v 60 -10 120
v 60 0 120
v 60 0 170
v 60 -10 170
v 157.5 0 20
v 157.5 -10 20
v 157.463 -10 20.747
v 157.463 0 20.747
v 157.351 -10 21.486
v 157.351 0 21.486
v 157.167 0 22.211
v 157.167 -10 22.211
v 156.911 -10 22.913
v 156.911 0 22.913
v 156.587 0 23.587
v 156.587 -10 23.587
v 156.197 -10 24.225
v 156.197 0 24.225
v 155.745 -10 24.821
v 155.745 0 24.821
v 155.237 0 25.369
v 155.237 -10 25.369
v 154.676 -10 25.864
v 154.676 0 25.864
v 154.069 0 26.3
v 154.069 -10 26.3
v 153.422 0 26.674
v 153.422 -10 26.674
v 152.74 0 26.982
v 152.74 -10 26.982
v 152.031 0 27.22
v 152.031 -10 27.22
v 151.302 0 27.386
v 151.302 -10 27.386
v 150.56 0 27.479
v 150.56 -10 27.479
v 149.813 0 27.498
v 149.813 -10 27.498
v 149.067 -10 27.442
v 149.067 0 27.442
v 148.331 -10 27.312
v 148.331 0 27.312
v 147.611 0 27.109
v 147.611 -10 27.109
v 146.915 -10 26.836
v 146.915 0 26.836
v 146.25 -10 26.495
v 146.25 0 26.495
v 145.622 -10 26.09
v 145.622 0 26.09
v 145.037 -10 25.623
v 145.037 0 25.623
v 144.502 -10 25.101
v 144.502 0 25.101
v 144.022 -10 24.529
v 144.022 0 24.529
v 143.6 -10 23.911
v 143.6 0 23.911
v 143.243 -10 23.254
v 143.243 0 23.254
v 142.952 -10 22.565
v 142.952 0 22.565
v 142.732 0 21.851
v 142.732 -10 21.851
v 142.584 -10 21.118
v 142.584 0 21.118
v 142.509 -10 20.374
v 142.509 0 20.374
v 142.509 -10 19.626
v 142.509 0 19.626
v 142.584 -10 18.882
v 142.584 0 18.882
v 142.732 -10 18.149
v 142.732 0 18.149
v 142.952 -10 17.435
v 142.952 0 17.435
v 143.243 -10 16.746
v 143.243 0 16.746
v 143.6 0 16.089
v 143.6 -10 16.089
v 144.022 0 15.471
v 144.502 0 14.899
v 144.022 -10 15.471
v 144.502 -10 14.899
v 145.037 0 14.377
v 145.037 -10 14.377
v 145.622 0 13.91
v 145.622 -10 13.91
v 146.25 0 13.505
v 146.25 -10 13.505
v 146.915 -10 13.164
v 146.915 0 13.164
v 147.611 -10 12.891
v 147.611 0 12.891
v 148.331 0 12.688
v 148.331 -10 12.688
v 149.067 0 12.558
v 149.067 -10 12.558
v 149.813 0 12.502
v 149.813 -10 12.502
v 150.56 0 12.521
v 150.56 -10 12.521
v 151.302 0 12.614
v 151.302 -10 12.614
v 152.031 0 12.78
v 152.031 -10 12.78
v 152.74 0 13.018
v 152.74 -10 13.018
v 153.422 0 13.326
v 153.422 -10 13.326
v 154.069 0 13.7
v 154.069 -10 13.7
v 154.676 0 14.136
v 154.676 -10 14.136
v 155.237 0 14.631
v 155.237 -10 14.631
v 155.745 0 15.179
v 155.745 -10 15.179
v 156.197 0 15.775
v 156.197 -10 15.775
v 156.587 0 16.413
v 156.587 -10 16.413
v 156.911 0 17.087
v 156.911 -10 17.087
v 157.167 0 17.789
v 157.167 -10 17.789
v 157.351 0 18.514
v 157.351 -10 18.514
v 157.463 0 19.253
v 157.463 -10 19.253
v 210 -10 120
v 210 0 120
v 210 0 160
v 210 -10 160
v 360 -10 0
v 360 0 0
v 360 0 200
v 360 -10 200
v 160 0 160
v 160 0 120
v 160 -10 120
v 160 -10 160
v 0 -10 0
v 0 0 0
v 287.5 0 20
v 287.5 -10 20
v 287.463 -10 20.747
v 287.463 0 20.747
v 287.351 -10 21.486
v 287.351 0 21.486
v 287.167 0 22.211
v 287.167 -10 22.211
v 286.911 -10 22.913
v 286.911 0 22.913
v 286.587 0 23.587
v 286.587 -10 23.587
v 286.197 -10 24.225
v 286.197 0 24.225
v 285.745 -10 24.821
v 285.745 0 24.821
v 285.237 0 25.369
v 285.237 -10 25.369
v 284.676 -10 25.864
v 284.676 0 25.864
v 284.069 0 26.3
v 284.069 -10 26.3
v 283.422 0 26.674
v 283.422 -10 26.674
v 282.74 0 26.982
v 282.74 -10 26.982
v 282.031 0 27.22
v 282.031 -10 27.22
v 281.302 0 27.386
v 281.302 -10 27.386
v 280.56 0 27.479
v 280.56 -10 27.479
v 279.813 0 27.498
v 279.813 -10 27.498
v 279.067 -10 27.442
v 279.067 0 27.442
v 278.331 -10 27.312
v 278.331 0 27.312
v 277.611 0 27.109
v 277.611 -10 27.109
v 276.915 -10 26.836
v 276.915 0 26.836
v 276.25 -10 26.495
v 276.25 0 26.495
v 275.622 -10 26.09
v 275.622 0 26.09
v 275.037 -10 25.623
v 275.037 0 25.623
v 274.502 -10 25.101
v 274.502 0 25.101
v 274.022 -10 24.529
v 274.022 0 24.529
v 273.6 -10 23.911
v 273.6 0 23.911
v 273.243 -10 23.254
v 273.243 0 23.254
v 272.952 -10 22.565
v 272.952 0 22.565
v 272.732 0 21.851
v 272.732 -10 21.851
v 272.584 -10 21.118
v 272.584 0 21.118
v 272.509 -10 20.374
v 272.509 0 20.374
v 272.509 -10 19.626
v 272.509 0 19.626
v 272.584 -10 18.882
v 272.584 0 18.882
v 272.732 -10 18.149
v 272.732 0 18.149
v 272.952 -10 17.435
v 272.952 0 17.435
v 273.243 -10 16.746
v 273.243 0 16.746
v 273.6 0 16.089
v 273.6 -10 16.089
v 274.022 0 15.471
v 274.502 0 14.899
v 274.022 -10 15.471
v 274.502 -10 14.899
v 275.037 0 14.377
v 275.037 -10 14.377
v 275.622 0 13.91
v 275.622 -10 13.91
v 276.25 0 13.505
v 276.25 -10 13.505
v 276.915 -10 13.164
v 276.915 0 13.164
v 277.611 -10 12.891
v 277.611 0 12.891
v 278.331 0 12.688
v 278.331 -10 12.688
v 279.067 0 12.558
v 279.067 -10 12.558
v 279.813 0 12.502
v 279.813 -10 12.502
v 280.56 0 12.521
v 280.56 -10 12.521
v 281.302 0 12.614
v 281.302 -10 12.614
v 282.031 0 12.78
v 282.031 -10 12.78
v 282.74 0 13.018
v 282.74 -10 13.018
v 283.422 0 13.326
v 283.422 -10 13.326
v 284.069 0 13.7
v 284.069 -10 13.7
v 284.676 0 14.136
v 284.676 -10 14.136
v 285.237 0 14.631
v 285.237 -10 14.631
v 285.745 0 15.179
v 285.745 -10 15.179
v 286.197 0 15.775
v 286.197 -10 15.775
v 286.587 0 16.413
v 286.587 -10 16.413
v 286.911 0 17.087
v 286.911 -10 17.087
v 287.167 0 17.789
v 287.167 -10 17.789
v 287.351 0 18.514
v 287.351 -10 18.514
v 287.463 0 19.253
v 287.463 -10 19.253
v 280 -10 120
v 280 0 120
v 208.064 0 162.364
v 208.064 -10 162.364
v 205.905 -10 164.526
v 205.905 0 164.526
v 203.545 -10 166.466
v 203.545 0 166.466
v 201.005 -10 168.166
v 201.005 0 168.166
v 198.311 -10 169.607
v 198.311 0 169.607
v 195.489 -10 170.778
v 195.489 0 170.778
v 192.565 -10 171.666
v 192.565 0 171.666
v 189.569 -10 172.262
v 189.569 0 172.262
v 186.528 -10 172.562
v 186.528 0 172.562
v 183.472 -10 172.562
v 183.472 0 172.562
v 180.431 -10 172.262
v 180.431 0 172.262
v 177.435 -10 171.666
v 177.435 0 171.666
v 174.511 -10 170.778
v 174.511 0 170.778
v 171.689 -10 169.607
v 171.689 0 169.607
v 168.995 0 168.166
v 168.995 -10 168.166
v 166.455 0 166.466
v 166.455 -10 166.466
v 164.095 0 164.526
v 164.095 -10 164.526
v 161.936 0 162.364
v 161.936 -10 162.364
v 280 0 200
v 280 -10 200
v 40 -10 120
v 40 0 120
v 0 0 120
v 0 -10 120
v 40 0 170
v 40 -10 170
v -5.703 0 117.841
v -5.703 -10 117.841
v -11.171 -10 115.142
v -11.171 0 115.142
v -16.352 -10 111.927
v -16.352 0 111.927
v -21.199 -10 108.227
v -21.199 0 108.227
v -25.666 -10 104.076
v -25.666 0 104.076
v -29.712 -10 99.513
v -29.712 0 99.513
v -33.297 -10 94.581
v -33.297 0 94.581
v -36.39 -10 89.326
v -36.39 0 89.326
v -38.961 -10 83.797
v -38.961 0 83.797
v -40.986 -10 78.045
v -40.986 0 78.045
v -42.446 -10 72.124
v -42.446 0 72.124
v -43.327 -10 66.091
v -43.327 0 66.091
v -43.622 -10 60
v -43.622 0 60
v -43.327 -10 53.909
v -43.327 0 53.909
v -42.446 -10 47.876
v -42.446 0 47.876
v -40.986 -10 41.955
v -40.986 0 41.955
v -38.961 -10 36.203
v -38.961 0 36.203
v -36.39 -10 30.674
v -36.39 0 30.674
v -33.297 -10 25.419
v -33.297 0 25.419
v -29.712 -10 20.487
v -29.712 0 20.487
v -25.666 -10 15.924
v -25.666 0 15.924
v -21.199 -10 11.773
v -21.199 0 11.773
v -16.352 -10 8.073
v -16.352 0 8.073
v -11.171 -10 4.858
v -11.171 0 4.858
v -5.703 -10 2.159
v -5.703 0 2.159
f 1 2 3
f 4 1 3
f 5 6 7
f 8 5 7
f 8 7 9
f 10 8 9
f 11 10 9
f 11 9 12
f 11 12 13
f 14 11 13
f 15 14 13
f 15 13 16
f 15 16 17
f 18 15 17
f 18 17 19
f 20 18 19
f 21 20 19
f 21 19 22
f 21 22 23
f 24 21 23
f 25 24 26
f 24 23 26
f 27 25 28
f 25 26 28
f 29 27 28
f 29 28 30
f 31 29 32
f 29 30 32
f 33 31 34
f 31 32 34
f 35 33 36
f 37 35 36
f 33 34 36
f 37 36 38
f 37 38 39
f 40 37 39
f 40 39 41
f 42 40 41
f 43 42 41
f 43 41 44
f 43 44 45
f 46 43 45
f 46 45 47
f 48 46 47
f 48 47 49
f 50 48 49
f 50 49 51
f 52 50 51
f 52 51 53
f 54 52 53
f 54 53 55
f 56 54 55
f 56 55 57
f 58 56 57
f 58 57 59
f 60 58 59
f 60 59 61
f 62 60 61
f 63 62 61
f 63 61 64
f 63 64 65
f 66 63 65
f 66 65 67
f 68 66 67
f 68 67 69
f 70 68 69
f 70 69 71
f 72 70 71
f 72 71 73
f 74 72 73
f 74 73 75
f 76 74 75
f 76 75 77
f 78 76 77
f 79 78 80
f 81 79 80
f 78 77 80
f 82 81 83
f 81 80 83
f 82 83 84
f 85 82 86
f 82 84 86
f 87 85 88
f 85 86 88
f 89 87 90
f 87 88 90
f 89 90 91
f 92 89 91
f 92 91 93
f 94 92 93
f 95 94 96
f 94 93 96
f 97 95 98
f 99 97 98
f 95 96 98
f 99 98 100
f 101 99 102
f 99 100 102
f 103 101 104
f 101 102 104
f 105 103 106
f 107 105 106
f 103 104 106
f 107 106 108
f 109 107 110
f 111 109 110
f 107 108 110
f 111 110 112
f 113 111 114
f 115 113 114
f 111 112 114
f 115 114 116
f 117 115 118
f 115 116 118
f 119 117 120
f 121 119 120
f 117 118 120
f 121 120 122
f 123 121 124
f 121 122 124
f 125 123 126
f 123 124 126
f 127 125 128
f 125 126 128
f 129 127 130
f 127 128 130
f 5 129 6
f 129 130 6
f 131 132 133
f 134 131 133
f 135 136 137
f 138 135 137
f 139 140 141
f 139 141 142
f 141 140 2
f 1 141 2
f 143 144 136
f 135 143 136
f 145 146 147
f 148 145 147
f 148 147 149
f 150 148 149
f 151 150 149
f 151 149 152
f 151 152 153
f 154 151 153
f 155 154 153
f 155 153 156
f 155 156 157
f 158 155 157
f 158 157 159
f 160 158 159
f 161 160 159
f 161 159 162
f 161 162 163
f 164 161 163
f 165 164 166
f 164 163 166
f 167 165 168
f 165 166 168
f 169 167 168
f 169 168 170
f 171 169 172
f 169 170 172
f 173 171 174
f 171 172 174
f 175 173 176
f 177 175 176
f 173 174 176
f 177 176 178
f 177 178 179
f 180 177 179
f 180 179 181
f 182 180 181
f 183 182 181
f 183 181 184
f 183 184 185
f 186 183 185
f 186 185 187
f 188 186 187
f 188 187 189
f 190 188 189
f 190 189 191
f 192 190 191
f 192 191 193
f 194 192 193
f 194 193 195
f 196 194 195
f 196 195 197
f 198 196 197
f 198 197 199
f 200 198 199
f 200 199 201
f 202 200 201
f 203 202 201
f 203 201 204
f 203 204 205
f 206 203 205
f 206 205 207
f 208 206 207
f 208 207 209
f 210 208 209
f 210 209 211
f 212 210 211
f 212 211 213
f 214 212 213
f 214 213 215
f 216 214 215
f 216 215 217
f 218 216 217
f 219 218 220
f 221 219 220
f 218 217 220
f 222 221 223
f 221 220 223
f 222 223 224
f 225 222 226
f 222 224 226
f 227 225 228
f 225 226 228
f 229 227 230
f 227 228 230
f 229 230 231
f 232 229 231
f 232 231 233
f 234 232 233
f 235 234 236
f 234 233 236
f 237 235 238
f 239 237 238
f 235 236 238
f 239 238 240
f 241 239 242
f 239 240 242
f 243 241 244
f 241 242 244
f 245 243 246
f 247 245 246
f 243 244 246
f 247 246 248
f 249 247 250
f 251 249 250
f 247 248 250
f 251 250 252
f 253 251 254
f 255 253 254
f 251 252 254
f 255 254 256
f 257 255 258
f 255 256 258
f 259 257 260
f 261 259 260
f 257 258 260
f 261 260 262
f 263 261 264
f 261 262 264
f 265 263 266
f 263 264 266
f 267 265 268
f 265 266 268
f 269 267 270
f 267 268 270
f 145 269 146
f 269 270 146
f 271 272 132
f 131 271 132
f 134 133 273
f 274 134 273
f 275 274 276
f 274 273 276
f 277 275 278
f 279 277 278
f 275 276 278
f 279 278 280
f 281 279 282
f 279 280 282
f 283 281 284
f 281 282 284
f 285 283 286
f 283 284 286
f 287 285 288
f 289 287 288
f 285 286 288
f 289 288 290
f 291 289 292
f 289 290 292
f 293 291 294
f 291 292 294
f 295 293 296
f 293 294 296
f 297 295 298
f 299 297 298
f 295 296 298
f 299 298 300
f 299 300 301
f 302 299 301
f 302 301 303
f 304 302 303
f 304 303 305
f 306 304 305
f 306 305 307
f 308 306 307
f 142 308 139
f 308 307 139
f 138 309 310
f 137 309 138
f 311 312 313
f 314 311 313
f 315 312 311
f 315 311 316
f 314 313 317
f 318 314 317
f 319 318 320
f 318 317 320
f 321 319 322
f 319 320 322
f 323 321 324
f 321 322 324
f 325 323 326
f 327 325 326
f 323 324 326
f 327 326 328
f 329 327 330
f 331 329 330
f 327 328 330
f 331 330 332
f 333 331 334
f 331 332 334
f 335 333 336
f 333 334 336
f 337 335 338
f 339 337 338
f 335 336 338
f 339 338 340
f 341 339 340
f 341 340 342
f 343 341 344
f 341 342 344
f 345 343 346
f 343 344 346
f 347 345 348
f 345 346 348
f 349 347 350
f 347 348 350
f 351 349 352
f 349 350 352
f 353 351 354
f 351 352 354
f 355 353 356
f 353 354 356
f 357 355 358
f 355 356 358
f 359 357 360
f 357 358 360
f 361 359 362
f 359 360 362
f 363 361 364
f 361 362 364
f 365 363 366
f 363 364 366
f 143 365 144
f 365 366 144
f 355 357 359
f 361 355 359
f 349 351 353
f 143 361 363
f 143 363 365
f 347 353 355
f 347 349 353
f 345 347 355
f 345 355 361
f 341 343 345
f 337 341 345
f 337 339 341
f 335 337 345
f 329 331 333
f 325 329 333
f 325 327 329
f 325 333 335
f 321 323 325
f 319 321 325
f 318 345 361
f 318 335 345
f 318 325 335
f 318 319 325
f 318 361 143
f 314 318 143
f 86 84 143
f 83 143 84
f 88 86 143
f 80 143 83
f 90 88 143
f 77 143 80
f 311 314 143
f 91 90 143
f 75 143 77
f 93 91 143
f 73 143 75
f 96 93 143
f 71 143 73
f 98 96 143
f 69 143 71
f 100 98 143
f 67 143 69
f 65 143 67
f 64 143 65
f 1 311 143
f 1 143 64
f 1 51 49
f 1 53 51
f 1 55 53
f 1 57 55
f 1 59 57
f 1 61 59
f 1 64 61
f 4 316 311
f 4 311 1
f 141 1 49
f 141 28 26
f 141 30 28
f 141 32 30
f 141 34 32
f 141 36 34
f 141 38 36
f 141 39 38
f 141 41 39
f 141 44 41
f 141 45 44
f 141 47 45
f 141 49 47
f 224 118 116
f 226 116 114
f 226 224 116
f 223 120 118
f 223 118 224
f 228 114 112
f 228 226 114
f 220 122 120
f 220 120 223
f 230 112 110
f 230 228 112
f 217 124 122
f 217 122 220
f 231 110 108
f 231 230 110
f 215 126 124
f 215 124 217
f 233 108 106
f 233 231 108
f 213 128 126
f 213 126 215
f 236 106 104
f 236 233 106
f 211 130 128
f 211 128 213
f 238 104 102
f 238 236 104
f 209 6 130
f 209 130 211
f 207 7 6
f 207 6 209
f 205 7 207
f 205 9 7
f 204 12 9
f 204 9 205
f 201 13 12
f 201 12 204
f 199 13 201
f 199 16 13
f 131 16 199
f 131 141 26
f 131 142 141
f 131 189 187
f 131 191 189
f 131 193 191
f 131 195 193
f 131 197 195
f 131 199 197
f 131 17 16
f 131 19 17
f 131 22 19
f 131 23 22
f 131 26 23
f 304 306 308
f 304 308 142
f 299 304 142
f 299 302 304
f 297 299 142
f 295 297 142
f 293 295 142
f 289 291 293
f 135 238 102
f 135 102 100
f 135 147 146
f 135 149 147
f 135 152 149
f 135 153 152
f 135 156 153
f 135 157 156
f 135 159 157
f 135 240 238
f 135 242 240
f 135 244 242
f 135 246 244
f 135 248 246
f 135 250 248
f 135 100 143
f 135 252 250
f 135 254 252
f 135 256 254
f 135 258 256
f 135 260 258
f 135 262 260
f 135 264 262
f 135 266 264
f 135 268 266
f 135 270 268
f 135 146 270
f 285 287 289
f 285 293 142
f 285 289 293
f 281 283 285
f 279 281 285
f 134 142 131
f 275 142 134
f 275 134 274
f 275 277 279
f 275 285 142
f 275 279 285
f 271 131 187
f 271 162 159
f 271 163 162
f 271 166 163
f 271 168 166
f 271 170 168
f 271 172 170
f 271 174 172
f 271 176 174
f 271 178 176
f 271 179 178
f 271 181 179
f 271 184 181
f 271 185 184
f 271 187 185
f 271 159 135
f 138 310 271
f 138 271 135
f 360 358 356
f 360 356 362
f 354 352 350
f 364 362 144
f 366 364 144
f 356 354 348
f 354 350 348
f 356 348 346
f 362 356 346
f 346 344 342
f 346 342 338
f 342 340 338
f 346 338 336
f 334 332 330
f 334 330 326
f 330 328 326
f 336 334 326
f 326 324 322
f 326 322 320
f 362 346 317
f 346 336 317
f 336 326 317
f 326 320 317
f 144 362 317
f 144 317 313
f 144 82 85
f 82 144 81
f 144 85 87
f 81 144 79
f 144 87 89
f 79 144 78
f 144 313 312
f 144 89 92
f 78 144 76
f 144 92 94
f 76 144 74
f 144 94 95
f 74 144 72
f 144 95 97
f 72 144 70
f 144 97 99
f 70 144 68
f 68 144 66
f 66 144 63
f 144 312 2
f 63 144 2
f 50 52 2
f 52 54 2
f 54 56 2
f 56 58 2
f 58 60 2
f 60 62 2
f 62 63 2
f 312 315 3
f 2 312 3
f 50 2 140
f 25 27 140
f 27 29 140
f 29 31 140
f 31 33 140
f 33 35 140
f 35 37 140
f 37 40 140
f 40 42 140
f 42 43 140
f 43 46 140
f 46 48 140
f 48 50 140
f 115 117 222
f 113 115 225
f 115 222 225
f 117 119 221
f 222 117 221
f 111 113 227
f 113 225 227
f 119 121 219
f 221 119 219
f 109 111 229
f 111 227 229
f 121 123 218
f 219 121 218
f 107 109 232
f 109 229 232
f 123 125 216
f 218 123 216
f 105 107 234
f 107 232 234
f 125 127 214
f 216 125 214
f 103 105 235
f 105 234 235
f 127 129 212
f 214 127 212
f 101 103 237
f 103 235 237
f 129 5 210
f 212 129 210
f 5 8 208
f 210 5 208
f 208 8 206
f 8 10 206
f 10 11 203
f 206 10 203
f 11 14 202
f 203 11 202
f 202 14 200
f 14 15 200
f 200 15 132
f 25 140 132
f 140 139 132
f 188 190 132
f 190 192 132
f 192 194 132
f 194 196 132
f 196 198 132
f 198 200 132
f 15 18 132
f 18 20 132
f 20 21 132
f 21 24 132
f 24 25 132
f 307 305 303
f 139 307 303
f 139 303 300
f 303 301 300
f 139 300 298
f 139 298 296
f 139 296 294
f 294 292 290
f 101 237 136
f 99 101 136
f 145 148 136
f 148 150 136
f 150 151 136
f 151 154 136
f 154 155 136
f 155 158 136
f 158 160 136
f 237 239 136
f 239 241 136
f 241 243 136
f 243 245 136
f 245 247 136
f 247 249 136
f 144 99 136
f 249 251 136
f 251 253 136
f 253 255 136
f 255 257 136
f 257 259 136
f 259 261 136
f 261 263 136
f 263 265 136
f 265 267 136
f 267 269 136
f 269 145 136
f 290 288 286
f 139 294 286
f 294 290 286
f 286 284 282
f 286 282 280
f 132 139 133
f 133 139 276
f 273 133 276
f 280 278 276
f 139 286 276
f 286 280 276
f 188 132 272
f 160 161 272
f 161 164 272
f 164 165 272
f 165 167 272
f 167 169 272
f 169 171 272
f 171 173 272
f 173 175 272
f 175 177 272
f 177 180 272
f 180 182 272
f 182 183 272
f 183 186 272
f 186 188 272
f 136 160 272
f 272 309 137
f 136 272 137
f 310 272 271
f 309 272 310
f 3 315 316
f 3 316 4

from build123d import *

# Parameters (mm, degrees)
F0_W     = 80
F0_H     = 80
F0_W_2   = 20
F0_H_2   = 50
F0_W_3   = 50
F0_H_3   = 40
F1_DEPTH = 10
F2_R     = 7.5
F3_DEPTH = 10.001


with BuildPart() as f1:
    # F0 (on Front) → F1 (new body)
    with BuildSketch(Plane.XZ):
        Polygon((0, 120), (0, 0), (360, 0), (360, 120), (280, 120), (210, 120), (160, 120), (60, 120), (40, 120), align=None)
        with BuildLine():
            ThreePointArc((0, 120), (-43.622246, 60), (0, 0))
            Line((0, 0), (0, 120))
        make_face()
        with Locations((320, 160)):
            Rectangle(F0_W, F0_H)
        with Locations((50, 145)):
            Rectangle(F0_W_2, F0_H_2)
        with Locations((185, 140)):
            Rectangle(F0_W_3, F0_H_3)
        with BuildLine():
            Line((160, 160), (210, 160))
            ThreePointArc((210, 160), (185, 172.599857), (160, 160))
        make_face()
    extrude(amount=F1_DEPTH)

    # F2 (on face) → F3 (cut, through all)
    with BuildSketch(Plane.XZ.offset(10)):
        with Locations((150, 20)):
            Circle(F2_R)
        with Locations((280, 20)):
            Circle(F2_R)
    extrude(amount=-F3_DEPTH, mode=Mode.SUBTRACT)


solid = f1.part
